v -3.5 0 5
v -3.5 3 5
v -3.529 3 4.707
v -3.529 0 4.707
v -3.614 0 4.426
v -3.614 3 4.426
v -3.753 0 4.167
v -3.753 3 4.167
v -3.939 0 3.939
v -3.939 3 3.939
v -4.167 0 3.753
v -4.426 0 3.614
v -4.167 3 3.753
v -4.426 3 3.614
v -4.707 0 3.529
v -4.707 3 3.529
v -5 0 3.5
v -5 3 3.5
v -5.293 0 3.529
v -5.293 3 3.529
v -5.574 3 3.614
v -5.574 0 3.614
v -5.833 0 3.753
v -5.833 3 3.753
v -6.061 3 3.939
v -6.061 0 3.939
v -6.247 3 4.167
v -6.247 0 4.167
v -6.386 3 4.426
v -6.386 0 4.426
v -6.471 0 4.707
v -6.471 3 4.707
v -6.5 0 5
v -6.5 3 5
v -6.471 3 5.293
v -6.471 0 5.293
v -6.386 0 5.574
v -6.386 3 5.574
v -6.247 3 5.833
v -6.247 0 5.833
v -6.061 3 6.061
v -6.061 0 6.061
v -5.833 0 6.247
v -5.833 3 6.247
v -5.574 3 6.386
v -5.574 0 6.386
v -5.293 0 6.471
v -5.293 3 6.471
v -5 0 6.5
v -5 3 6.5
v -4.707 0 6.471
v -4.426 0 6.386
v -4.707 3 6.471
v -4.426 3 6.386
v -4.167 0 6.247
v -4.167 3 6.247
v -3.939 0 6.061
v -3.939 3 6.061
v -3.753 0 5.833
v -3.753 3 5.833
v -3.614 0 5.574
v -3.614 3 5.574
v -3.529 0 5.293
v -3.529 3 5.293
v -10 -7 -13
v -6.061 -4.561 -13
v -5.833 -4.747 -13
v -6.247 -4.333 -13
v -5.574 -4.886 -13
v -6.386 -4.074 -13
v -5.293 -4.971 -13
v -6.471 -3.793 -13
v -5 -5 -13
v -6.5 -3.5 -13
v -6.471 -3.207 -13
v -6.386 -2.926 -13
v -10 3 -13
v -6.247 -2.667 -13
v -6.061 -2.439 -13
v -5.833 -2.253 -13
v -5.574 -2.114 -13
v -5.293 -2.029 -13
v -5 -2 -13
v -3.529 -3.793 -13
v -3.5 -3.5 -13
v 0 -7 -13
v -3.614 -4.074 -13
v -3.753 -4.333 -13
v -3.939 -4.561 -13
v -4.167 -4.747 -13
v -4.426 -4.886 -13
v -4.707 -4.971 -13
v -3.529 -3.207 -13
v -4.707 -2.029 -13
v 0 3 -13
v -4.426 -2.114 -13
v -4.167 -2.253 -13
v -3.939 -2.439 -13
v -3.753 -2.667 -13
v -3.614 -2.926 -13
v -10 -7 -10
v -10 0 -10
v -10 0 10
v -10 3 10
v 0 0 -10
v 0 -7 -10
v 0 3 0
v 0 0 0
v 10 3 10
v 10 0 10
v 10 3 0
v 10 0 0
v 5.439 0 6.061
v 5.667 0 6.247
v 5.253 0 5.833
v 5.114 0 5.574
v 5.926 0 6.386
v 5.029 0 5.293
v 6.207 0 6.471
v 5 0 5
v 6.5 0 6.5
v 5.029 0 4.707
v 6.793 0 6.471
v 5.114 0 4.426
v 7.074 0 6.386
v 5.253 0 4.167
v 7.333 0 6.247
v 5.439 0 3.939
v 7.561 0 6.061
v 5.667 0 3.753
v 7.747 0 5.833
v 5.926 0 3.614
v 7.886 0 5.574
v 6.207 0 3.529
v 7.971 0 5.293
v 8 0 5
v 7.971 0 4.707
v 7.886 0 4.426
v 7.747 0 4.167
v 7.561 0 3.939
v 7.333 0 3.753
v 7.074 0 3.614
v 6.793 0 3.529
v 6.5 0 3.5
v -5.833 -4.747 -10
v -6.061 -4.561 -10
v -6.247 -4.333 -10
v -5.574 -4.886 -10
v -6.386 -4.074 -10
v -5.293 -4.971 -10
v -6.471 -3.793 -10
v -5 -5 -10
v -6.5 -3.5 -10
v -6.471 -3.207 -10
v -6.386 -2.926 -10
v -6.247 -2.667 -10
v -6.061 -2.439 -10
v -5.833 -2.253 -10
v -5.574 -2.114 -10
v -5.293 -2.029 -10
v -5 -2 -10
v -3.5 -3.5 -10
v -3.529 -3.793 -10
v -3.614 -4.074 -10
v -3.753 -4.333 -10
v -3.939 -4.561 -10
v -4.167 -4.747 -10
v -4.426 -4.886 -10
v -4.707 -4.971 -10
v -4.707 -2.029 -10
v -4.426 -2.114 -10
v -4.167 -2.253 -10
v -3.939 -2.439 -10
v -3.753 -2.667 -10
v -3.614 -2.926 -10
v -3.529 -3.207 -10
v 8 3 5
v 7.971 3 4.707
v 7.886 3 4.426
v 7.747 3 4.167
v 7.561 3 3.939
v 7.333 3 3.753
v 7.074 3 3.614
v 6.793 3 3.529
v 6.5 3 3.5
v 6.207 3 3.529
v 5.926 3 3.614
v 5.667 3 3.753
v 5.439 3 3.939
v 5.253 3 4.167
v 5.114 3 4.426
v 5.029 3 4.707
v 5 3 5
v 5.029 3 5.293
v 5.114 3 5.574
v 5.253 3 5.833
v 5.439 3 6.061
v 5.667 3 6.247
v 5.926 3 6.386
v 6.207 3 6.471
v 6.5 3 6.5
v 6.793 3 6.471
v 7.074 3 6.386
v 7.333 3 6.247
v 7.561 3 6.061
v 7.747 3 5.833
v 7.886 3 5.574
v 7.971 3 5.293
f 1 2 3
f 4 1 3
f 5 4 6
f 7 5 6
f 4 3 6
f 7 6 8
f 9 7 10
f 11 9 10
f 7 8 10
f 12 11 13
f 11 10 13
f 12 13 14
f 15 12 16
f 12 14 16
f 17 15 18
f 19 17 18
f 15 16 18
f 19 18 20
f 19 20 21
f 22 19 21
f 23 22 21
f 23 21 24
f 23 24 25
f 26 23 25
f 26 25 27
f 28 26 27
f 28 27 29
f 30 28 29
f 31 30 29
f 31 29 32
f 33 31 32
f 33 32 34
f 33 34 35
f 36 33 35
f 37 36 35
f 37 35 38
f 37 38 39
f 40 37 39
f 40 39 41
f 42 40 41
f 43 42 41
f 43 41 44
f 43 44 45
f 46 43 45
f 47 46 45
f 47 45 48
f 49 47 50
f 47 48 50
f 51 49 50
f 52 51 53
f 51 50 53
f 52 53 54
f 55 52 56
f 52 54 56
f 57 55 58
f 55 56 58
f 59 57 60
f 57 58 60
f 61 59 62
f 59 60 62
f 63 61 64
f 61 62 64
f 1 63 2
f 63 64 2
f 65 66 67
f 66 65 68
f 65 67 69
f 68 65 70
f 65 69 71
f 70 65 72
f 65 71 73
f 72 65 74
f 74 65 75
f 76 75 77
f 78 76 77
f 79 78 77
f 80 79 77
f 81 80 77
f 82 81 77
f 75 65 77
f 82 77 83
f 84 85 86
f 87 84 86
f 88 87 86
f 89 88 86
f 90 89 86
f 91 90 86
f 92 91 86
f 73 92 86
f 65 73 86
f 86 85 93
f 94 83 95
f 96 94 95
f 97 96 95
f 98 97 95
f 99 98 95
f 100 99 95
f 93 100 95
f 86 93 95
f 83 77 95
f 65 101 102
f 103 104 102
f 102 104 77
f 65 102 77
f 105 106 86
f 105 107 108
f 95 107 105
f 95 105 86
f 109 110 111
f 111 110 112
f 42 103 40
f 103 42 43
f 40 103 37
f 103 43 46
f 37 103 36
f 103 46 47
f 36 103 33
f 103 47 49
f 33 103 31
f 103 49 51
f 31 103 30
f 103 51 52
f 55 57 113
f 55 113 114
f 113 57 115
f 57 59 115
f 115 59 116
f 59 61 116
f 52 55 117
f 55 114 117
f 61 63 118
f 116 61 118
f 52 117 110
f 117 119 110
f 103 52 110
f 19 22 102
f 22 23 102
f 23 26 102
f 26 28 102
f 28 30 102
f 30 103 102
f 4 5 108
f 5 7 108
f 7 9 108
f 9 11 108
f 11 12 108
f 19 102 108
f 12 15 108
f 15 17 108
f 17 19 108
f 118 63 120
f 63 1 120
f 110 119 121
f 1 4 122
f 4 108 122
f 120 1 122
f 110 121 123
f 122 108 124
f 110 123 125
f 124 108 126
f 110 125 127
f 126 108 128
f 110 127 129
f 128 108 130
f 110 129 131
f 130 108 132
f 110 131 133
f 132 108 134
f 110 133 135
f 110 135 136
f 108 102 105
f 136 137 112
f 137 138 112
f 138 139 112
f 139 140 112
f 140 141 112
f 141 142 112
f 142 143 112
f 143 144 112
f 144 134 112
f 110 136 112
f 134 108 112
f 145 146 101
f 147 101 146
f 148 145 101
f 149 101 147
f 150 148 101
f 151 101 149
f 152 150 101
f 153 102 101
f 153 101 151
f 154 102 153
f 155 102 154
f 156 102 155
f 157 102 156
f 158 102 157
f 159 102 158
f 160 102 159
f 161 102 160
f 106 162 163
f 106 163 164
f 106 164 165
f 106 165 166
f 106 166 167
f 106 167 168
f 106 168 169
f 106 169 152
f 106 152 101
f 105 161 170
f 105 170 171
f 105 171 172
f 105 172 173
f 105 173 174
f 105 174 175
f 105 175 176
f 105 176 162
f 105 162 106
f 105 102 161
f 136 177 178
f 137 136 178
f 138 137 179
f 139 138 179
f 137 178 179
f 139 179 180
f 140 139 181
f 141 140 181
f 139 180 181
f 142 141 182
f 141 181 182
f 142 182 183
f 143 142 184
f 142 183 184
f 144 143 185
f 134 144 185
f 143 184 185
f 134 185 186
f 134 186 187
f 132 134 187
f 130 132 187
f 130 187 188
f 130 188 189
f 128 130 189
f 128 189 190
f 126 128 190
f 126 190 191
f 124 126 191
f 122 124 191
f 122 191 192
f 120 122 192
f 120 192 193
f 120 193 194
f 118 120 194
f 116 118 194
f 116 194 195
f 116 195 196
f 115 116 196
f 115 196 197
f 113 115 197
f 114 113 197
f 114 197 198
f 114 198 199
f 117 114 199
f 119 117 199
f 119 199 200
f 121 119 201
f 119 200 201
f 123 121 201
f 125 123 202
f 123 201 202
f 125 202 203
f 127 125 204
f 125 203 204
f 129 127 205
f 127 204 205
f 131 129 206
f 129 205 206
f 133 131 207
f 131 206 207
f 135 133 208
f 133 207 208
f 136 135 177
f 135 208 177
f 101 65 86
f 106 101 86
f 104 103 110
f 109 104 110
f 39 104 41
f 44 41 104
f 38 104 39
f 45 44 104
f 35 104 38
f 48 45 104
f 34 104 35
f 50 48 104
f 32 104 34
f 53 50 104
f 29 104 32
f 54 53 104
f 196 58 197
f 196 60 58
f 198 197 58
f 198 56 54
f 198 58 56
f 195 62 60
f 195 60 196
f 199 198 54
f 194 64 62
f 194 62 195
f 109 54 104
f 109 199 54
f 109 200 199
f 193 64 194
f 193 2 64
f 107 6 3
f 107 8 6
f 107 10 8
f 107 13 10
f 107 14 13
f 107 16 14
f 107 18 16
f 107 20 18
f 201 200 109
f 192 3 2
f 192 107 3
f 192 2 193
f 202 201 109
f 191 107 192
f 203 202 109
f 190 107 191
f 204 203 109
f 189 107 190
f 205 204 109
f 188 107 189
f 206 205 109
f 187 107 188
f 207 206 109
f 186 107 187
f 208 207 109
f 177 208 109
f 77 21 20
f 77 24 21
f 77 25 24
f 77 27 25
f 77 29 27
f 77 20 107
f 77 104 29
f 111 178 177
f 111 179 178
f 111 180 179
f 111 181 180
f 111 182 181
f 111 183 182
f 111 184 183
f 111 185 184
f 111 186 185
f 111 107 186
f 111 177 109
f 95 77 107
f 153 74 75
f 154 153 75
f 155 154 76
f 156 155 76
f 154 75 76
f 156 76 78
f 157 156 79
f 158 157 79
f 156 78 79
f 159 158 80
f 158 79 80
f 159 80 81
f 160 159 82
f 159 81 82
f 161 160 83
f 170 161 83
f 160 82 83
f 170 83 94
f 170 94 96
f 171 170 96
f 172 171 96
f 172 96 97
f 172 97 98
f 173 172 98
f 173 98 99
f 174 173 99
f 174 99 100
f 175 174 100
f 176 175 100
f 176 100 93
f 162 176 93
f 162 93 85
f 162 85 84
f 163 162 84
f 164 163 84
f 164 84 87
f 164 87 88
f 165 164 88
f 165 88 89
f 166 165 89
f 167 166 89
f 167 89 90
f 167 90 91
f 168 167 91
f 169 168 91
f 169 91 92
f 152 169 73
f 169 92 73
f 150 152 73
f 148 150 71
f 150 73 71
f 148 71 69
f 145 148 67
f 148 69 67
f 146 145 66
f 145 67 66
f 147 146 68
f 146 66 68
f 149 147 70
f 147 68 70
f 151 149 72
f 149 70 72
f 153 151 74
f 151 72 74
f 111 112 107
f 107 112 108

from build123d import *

# Parameters (mm, degrees)
BOSS_EXTRUDE1_DEPTH = 3
SKETCH2_W           = 10
SKETCH2_H           = 3
BOSS_EXTRUDE2_DEPTH = 10
CUT_EXTRUDE1_REACH  = 12
SKETCH3_R           = 1.5
CUT_EXTRUDE2_REACH  = 25
SKETCH4_R           = 1.5


with BuildPart() as part:
    # Sketch1 → Boss-Extrude1 (new body)
    with BuildSketch(Plane(origin=(0, 0, 0), x_dir=(1, 0, 0), z_dir=(0, 1, 0))):
        Polygon((0, 0), (0, 10), (-10, 10), (-10, -10), (10, -10), (10, 0), align=None)
    extrude(amount=BOSS_EXTRUDE1_DEPTH)

    # Sketch2 → Boss-Extrude2 (add)
    with BuildSketch(Plane(origin=(0, 3, 0), x_dir=(1, 0, 0), z_dir=(0, 1, 0))):
        with Locations((-5, 11.5)):
            Rectangle(SKETCH2_W, SKETCH2_H)
    extrude(amount=-BOSS_EXTRUDE2_DEPTH)

    # Sketch3 → Cut-Extrude1 (cut, up to next)
    with BuildSketch(Plane(origin=(0, 3, 0), x_dir=(1, 0, 0), z_dir=(0, 1, 0)), mode=Mode.PRIVATE) as cut_extrude1_sk1:
        with Locations((-5, -5)):
            Circle(SKETCH3_R)
    cut_extrude1_tool1 = extrude(cut_extrude1_sk1.sketch, amount=-CUT_EXTRUDE1_REACH, mode=Mode.PRIVATE) & part.part
    add(cut_extrude1_tool1.solids().sort_by_distance((-5, 3, 5))[0], mode=Mode.SUBTRACT)
    # Sketch3 → Cut-Extrude1 (cut, up to next)
    with BuildSketch(Plane(origin=(0, 3, 0), x_dir=(1, 0, 0), z_dir=(0, 1, 0)), mode=Mode.PRIVATE) as cut_extrude1_sk2:
        with Locations((6.5, -5)):
            Circle(SKETCH3_R)
    cut_extrude1_tool2 = extrude(cut_extrude1_sk2.sketch, amount=-CUT_EXTRUDE1_REACH, mode=Mode.PRIVATE) & part.part
    add(cut_extrude1_tool2.solids().sort_by_distance((6.5, 3, 5))[0], mode=Mode.SUBTRACT)

    # Sketch4 → Cut-Extrude2 (cut, up to next)
    with BuildSketch(Plane(origin=(0, 0, -13), x_dir=(-1, 0, 0), z_dir=(0, 0, -1)), mode=Mode.PRIVATE) as cut_extrude2_sk1:
        with Locations((5, -3.5)):
            Circle(SKETCH4_R)
    cut_extrude2_tool1 = extrude(cut_extrude2_sk1.sketch, amount=-CUT_EXTRUDE2_REACH, mode=Mode.PRIVATE) & part.part
    add(cut_extrude2_tool1.solids().sort_by_distance((-5, -3.5, -13))[0], mode=Mode.SUBTRACT)


solid = part.part
